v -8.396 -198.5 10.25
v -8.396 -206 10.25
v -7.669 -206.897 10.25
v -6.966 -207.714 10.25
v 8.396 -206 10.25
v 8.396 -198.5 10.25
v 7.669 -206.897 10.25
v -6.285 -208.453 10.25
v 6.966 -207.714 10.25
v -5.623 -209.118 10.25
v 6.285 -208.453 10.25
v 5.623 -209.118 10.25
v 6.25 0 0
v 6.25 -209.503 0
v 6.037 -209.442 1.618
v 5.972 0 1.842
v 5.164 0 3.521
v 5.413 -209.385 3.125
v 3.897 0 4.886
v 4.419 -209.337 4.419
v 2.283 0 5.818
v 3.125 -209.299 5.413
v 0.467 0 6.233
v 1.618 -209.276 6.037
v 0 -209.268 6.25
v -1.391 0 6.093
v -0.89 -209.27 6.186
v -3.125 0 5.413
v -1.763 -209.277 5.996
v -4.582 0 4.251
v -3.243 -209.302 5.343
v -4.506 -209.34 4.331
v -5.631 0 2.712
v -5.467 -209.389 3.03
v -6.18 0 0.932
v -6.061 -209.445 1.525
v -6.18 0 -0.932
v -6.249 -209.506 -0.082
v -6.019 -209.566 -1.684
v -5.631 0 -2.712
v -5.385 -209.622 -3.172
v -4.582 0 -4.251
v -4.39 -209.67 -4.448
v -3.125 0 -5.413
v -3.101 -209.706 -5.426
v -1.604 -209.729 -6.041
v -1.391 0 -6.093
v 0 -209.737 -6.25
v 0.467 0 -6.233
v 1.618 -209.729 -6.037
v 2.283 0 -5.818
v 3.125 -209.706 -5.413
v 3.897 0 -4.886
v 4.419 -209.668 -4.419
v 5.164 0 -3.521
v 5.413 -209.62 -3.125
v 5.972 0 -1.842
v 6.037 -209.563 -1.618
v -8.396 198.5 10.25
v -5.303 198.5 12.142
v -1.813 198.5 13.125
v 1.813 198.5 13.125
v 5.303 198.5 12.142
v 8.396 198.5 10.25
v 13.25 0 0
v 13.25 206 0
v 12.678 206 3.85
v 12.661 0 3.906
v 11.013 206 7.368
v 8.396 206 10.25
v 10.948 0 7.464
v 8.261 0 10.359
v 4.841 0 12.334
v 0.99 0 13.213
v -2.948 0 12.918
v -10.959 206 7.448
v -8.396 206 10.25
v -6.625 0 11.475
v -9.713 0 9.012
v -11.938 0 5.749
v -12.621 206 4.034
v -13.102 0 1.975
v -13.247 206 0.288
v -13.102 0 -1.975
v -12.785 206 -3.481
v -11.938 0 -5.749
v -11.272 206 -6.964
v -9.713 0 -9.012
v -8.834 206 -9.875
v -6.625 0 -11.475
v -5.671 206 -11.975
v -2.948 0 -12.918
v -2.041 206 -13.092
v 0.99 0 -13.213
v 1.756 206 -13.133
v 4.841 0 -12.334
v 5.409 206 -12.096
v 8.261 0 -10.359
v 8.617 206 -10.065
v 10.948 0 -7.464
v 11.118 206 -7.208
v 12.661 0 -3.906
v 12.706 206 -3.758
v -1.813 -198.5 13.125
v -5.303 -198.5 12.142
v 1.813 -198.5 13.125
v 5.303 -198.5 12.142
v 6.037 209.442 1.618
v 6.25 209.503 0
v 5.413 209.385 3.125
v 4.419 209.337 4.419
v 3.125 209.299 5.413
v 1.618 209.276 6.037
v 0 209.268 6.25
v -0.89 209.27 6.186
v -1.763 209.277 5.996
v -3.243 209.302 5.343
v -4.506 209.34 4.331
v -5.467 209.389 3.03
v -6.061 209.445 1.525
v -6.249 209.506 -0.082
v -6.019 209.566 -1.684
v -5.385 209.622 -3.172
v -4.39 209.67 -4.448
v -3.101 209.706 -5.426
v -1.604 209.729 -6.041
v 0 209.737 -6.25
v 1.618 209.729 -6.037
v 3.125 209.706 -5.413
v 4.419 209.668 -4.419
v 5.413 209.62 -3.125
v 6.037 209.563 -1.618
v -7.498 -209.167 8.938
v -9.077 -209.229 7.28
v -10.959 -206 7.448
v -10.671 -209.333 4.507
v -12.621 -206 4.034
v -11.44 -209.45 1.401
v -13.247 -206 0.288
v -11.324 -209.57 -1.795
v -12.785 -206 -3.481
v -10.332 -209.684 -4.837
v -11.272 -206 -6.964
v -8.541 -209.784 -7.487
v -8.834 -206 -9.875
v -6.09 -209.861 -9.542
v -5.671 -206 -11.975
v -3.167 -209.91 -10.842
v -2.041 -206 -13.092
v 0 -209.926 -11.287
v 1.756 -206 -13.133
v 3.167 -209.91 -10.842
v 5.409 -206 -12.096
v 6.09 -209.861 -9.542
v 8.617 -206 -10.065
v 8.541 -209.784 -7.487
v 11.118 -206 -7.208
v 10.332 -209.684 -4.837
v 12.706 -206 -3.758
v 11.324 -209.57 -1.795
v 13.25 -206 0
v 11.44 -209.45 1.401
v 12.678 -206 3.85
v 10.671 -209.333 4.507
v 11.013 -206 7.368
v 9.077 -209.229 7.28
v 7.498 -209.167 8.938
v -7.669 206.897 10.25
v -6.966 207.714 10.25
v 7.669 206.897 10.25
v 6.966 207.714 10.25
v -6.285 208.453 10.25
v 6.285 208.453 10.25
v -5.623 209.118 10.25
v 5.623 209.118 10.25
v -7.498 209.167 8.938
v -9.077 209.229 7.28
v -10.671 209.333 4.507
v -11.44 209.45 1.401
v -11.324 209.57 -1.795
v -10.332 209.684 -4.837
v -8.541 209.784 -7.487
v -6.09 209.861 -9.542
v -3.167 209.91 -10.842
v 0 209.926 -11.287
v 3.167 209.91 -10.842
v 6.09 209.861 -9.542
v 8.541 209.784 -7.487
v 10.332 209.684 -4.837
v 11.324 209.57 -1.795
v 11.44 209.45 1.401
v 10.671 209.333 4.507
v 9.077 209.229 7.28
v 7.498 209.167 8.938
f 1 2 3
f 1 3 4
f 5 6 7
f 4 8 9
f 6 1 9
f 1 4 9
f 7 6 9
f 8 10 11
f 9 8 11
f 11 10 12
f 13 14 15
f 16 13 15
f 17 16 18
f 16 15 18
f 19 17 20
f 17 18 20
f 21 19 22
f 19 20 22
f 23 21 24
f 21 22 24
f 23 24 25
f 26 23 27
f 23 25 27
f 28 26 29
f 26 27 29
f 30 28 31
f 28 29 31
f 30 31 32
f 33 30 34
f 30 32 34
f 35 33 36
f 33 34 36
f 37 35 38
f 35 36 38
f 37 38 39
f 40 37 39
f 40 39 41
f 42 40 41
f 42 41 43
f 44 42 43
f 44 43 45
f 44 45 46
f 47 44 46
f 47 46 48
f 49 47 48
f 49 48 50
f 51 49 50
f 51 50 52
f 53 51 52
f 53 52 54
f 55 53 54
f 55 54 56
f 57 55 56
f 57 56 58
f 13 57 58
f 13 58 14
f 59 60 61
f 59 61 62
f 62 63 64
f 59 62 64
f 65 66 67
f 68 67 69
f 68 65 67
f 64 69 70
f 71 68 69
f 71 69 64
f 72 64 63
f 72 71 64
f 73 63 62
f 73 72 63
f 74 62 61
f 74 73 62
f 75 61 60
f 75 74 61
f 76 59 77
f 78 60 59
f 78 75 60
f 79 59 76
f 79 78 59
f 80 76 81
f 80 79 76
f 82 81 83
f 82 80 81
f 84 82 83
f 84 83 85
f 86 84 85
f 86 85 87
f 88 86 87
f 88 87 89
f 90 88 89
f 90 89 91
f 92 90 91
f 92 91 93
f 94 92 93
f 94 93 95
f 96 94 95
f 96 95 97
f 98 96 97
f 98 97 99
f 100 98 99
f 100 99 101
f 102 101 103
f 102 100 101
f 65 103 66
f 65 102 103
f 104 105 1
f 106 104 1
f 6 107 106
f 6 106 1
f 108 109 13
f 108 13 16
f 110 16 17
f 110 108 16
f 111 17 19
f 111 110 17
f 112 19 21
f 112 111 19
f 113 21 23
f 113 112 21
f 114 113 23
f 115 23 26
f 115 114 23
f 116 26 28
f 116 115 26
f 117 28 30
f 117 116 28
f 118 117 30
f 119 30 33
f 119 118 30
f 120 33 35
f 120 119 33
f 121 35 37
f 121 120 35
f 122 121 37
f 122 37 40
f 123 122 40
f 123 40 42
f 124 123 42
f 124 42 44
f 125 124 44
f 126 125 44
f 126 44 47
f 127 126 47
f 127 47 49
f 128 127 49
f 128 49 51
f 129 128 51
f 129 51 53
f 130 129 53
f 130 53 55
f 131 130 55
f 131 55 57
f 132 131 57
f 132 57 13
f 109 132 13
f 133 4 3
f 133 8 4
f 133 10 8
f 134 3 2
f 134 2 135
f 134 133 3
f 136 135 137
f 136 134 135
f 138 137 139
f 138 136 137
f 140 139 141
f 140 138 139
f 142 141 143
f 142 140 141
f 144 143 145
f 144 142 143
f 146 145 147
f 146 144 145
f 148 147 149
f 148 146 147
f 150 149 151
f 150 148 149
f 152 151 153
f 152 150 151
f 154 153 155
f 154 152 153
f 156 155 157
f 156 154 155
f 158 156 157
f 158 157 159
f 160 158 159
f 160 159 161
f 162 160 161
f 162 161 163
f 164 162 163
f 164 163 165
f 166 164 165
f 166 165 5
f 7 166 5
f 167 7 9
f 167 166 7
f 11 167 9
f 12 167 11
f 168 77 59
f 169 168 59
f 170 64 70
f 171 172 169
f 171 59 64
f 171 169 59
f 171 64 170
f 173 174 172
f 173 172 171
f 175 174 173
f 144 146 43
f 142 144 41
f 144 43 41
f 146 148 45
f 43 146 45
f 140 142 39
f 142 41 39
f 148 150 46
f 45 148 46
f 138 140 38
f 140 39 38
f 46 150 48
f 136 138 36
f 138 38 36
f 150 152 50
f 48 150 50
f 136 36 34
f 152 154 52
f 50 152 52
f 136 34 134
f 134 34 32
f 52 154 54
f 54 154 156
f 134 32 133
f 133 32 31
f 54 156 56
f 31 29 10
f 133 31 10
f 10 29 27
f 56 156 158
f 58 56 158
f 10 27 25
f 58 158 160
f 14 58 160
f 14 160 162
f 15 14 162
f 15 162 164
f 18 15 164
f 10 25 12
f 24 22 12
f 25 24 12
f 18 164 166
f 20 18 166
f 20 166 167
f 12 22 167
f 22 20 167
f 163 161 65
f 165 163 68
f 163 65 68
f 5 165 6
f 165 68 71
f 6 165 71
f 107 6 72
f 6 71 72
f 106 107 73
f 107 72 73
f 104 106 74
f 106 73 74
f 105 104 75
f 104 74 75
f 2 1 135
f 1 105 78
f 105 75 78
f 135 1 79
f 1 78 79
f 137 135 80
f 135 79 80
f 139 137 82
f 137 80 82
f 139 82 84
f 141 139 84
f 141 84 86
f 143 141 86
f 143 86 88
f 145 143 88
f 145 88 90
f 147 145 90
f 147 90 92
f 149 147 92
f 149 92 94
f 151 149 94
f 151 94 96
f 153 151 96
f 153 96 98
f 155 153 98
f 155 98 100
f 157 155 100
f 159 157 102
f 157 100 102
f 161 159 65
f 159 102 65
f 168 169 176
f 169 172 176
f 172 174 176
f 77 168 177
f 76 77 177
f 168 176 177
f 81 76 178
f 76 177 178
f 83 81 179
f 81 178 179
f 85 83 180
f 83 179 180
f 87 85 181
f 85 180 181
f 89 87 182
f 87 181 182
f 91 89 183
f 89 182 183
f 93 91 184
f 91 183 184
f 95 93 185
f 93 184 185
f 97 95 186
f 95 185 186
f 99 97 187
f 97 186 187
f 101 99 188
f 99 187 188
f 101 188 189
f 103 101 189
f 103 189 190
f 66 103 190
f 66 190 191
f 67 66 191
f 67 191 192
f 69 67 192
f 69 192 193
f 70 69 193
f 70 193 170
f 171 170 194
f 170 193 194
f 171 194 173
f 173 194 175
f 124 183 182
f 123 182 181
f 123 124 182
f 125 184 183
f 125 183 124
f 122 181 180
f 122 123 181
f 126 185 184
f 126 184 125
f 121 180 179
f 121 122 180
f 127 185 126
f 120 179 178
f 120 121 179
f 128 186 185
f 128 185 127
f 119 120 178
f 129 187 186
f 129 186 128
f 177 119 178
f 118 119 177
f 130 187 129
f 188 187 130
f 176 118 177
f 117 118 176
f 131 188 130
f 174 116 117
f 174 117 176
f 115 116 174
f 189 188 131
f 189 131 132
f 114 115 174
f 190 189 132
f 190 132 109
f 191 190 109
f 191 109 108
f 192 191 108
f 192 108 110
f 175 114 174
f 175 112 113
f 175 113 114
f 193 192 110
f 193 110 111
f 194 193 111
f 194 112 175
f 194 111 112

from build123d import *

# Parameters (mm, degrees)
F0_R          = 13.25
F1_DEPTH      = 210
F3_DEPTH      = 11.5
F4_R          = 6.25
F5_DEPTH      = 210.001
F9_DEPTH      = 13.251
F9_DEPTH_BACK = 13.251


with BuildPart() as f1:
    # F0 (on Front) → F1 (new body)
    with BuildSketch(Plane.XZ):
        Circle(F0_R)
    extrude(amount=F1_DEPTH)

    # F2 (on face) → F3 (cut)
    with BuildSketch(Plane.XZ.offset(210)):
        with BuildLine():
            ThreePointArc((8.3964278119, 10.25), (0, 13.25), (-8.3964278119, 10.25))
            Line((-8.3964278119, 10.25), (8.3964278119, 10.25))
        make_face()
    extrude(amount=-F3_DEPTH, mode=Mode.SUBTRACT)

    # F4 (on face) → F5 (cut, through all)
    with BuildSketch(Plane.XZ.offset(210)):
        Circle(F4_R)
    extrude(amount=-F5_DEPTH, mode=Mode.SUBTRACT)

    # F6 (on Right) → F7 (revolve, cut)
    with BuildSketch(Plane.YZ):
        Polygon((-210, -15.6165892258), (-206, -13.25), (-210, -11.25), align=None)
    revolve(axis=Axis((0, -105, 0), (0, -1, 0)), mode=Mode.SUBTRACT)

    # F8 (on Right) → F9 (cut, two sides)
    with BuildSketch(Plane.YZ) as f9_sk:
        Polygon((-209.0051316588, 13.25), (-210, 13.25), (-210, -13.25), align=None)
    extrude(amount=-F9_DEPTH, mode=Mode.SUBTRACT)
    extrude(f9_sk.sketch, amount=F9_DEPTH_BACK, mode=Mode.SUBTRACT)

    # F10: F1 across plane


with BuildPart() as f1_1:
    add(f1.part)
    add(f1.part.mirror(Plane.XZ))


solid = f1_1.part
